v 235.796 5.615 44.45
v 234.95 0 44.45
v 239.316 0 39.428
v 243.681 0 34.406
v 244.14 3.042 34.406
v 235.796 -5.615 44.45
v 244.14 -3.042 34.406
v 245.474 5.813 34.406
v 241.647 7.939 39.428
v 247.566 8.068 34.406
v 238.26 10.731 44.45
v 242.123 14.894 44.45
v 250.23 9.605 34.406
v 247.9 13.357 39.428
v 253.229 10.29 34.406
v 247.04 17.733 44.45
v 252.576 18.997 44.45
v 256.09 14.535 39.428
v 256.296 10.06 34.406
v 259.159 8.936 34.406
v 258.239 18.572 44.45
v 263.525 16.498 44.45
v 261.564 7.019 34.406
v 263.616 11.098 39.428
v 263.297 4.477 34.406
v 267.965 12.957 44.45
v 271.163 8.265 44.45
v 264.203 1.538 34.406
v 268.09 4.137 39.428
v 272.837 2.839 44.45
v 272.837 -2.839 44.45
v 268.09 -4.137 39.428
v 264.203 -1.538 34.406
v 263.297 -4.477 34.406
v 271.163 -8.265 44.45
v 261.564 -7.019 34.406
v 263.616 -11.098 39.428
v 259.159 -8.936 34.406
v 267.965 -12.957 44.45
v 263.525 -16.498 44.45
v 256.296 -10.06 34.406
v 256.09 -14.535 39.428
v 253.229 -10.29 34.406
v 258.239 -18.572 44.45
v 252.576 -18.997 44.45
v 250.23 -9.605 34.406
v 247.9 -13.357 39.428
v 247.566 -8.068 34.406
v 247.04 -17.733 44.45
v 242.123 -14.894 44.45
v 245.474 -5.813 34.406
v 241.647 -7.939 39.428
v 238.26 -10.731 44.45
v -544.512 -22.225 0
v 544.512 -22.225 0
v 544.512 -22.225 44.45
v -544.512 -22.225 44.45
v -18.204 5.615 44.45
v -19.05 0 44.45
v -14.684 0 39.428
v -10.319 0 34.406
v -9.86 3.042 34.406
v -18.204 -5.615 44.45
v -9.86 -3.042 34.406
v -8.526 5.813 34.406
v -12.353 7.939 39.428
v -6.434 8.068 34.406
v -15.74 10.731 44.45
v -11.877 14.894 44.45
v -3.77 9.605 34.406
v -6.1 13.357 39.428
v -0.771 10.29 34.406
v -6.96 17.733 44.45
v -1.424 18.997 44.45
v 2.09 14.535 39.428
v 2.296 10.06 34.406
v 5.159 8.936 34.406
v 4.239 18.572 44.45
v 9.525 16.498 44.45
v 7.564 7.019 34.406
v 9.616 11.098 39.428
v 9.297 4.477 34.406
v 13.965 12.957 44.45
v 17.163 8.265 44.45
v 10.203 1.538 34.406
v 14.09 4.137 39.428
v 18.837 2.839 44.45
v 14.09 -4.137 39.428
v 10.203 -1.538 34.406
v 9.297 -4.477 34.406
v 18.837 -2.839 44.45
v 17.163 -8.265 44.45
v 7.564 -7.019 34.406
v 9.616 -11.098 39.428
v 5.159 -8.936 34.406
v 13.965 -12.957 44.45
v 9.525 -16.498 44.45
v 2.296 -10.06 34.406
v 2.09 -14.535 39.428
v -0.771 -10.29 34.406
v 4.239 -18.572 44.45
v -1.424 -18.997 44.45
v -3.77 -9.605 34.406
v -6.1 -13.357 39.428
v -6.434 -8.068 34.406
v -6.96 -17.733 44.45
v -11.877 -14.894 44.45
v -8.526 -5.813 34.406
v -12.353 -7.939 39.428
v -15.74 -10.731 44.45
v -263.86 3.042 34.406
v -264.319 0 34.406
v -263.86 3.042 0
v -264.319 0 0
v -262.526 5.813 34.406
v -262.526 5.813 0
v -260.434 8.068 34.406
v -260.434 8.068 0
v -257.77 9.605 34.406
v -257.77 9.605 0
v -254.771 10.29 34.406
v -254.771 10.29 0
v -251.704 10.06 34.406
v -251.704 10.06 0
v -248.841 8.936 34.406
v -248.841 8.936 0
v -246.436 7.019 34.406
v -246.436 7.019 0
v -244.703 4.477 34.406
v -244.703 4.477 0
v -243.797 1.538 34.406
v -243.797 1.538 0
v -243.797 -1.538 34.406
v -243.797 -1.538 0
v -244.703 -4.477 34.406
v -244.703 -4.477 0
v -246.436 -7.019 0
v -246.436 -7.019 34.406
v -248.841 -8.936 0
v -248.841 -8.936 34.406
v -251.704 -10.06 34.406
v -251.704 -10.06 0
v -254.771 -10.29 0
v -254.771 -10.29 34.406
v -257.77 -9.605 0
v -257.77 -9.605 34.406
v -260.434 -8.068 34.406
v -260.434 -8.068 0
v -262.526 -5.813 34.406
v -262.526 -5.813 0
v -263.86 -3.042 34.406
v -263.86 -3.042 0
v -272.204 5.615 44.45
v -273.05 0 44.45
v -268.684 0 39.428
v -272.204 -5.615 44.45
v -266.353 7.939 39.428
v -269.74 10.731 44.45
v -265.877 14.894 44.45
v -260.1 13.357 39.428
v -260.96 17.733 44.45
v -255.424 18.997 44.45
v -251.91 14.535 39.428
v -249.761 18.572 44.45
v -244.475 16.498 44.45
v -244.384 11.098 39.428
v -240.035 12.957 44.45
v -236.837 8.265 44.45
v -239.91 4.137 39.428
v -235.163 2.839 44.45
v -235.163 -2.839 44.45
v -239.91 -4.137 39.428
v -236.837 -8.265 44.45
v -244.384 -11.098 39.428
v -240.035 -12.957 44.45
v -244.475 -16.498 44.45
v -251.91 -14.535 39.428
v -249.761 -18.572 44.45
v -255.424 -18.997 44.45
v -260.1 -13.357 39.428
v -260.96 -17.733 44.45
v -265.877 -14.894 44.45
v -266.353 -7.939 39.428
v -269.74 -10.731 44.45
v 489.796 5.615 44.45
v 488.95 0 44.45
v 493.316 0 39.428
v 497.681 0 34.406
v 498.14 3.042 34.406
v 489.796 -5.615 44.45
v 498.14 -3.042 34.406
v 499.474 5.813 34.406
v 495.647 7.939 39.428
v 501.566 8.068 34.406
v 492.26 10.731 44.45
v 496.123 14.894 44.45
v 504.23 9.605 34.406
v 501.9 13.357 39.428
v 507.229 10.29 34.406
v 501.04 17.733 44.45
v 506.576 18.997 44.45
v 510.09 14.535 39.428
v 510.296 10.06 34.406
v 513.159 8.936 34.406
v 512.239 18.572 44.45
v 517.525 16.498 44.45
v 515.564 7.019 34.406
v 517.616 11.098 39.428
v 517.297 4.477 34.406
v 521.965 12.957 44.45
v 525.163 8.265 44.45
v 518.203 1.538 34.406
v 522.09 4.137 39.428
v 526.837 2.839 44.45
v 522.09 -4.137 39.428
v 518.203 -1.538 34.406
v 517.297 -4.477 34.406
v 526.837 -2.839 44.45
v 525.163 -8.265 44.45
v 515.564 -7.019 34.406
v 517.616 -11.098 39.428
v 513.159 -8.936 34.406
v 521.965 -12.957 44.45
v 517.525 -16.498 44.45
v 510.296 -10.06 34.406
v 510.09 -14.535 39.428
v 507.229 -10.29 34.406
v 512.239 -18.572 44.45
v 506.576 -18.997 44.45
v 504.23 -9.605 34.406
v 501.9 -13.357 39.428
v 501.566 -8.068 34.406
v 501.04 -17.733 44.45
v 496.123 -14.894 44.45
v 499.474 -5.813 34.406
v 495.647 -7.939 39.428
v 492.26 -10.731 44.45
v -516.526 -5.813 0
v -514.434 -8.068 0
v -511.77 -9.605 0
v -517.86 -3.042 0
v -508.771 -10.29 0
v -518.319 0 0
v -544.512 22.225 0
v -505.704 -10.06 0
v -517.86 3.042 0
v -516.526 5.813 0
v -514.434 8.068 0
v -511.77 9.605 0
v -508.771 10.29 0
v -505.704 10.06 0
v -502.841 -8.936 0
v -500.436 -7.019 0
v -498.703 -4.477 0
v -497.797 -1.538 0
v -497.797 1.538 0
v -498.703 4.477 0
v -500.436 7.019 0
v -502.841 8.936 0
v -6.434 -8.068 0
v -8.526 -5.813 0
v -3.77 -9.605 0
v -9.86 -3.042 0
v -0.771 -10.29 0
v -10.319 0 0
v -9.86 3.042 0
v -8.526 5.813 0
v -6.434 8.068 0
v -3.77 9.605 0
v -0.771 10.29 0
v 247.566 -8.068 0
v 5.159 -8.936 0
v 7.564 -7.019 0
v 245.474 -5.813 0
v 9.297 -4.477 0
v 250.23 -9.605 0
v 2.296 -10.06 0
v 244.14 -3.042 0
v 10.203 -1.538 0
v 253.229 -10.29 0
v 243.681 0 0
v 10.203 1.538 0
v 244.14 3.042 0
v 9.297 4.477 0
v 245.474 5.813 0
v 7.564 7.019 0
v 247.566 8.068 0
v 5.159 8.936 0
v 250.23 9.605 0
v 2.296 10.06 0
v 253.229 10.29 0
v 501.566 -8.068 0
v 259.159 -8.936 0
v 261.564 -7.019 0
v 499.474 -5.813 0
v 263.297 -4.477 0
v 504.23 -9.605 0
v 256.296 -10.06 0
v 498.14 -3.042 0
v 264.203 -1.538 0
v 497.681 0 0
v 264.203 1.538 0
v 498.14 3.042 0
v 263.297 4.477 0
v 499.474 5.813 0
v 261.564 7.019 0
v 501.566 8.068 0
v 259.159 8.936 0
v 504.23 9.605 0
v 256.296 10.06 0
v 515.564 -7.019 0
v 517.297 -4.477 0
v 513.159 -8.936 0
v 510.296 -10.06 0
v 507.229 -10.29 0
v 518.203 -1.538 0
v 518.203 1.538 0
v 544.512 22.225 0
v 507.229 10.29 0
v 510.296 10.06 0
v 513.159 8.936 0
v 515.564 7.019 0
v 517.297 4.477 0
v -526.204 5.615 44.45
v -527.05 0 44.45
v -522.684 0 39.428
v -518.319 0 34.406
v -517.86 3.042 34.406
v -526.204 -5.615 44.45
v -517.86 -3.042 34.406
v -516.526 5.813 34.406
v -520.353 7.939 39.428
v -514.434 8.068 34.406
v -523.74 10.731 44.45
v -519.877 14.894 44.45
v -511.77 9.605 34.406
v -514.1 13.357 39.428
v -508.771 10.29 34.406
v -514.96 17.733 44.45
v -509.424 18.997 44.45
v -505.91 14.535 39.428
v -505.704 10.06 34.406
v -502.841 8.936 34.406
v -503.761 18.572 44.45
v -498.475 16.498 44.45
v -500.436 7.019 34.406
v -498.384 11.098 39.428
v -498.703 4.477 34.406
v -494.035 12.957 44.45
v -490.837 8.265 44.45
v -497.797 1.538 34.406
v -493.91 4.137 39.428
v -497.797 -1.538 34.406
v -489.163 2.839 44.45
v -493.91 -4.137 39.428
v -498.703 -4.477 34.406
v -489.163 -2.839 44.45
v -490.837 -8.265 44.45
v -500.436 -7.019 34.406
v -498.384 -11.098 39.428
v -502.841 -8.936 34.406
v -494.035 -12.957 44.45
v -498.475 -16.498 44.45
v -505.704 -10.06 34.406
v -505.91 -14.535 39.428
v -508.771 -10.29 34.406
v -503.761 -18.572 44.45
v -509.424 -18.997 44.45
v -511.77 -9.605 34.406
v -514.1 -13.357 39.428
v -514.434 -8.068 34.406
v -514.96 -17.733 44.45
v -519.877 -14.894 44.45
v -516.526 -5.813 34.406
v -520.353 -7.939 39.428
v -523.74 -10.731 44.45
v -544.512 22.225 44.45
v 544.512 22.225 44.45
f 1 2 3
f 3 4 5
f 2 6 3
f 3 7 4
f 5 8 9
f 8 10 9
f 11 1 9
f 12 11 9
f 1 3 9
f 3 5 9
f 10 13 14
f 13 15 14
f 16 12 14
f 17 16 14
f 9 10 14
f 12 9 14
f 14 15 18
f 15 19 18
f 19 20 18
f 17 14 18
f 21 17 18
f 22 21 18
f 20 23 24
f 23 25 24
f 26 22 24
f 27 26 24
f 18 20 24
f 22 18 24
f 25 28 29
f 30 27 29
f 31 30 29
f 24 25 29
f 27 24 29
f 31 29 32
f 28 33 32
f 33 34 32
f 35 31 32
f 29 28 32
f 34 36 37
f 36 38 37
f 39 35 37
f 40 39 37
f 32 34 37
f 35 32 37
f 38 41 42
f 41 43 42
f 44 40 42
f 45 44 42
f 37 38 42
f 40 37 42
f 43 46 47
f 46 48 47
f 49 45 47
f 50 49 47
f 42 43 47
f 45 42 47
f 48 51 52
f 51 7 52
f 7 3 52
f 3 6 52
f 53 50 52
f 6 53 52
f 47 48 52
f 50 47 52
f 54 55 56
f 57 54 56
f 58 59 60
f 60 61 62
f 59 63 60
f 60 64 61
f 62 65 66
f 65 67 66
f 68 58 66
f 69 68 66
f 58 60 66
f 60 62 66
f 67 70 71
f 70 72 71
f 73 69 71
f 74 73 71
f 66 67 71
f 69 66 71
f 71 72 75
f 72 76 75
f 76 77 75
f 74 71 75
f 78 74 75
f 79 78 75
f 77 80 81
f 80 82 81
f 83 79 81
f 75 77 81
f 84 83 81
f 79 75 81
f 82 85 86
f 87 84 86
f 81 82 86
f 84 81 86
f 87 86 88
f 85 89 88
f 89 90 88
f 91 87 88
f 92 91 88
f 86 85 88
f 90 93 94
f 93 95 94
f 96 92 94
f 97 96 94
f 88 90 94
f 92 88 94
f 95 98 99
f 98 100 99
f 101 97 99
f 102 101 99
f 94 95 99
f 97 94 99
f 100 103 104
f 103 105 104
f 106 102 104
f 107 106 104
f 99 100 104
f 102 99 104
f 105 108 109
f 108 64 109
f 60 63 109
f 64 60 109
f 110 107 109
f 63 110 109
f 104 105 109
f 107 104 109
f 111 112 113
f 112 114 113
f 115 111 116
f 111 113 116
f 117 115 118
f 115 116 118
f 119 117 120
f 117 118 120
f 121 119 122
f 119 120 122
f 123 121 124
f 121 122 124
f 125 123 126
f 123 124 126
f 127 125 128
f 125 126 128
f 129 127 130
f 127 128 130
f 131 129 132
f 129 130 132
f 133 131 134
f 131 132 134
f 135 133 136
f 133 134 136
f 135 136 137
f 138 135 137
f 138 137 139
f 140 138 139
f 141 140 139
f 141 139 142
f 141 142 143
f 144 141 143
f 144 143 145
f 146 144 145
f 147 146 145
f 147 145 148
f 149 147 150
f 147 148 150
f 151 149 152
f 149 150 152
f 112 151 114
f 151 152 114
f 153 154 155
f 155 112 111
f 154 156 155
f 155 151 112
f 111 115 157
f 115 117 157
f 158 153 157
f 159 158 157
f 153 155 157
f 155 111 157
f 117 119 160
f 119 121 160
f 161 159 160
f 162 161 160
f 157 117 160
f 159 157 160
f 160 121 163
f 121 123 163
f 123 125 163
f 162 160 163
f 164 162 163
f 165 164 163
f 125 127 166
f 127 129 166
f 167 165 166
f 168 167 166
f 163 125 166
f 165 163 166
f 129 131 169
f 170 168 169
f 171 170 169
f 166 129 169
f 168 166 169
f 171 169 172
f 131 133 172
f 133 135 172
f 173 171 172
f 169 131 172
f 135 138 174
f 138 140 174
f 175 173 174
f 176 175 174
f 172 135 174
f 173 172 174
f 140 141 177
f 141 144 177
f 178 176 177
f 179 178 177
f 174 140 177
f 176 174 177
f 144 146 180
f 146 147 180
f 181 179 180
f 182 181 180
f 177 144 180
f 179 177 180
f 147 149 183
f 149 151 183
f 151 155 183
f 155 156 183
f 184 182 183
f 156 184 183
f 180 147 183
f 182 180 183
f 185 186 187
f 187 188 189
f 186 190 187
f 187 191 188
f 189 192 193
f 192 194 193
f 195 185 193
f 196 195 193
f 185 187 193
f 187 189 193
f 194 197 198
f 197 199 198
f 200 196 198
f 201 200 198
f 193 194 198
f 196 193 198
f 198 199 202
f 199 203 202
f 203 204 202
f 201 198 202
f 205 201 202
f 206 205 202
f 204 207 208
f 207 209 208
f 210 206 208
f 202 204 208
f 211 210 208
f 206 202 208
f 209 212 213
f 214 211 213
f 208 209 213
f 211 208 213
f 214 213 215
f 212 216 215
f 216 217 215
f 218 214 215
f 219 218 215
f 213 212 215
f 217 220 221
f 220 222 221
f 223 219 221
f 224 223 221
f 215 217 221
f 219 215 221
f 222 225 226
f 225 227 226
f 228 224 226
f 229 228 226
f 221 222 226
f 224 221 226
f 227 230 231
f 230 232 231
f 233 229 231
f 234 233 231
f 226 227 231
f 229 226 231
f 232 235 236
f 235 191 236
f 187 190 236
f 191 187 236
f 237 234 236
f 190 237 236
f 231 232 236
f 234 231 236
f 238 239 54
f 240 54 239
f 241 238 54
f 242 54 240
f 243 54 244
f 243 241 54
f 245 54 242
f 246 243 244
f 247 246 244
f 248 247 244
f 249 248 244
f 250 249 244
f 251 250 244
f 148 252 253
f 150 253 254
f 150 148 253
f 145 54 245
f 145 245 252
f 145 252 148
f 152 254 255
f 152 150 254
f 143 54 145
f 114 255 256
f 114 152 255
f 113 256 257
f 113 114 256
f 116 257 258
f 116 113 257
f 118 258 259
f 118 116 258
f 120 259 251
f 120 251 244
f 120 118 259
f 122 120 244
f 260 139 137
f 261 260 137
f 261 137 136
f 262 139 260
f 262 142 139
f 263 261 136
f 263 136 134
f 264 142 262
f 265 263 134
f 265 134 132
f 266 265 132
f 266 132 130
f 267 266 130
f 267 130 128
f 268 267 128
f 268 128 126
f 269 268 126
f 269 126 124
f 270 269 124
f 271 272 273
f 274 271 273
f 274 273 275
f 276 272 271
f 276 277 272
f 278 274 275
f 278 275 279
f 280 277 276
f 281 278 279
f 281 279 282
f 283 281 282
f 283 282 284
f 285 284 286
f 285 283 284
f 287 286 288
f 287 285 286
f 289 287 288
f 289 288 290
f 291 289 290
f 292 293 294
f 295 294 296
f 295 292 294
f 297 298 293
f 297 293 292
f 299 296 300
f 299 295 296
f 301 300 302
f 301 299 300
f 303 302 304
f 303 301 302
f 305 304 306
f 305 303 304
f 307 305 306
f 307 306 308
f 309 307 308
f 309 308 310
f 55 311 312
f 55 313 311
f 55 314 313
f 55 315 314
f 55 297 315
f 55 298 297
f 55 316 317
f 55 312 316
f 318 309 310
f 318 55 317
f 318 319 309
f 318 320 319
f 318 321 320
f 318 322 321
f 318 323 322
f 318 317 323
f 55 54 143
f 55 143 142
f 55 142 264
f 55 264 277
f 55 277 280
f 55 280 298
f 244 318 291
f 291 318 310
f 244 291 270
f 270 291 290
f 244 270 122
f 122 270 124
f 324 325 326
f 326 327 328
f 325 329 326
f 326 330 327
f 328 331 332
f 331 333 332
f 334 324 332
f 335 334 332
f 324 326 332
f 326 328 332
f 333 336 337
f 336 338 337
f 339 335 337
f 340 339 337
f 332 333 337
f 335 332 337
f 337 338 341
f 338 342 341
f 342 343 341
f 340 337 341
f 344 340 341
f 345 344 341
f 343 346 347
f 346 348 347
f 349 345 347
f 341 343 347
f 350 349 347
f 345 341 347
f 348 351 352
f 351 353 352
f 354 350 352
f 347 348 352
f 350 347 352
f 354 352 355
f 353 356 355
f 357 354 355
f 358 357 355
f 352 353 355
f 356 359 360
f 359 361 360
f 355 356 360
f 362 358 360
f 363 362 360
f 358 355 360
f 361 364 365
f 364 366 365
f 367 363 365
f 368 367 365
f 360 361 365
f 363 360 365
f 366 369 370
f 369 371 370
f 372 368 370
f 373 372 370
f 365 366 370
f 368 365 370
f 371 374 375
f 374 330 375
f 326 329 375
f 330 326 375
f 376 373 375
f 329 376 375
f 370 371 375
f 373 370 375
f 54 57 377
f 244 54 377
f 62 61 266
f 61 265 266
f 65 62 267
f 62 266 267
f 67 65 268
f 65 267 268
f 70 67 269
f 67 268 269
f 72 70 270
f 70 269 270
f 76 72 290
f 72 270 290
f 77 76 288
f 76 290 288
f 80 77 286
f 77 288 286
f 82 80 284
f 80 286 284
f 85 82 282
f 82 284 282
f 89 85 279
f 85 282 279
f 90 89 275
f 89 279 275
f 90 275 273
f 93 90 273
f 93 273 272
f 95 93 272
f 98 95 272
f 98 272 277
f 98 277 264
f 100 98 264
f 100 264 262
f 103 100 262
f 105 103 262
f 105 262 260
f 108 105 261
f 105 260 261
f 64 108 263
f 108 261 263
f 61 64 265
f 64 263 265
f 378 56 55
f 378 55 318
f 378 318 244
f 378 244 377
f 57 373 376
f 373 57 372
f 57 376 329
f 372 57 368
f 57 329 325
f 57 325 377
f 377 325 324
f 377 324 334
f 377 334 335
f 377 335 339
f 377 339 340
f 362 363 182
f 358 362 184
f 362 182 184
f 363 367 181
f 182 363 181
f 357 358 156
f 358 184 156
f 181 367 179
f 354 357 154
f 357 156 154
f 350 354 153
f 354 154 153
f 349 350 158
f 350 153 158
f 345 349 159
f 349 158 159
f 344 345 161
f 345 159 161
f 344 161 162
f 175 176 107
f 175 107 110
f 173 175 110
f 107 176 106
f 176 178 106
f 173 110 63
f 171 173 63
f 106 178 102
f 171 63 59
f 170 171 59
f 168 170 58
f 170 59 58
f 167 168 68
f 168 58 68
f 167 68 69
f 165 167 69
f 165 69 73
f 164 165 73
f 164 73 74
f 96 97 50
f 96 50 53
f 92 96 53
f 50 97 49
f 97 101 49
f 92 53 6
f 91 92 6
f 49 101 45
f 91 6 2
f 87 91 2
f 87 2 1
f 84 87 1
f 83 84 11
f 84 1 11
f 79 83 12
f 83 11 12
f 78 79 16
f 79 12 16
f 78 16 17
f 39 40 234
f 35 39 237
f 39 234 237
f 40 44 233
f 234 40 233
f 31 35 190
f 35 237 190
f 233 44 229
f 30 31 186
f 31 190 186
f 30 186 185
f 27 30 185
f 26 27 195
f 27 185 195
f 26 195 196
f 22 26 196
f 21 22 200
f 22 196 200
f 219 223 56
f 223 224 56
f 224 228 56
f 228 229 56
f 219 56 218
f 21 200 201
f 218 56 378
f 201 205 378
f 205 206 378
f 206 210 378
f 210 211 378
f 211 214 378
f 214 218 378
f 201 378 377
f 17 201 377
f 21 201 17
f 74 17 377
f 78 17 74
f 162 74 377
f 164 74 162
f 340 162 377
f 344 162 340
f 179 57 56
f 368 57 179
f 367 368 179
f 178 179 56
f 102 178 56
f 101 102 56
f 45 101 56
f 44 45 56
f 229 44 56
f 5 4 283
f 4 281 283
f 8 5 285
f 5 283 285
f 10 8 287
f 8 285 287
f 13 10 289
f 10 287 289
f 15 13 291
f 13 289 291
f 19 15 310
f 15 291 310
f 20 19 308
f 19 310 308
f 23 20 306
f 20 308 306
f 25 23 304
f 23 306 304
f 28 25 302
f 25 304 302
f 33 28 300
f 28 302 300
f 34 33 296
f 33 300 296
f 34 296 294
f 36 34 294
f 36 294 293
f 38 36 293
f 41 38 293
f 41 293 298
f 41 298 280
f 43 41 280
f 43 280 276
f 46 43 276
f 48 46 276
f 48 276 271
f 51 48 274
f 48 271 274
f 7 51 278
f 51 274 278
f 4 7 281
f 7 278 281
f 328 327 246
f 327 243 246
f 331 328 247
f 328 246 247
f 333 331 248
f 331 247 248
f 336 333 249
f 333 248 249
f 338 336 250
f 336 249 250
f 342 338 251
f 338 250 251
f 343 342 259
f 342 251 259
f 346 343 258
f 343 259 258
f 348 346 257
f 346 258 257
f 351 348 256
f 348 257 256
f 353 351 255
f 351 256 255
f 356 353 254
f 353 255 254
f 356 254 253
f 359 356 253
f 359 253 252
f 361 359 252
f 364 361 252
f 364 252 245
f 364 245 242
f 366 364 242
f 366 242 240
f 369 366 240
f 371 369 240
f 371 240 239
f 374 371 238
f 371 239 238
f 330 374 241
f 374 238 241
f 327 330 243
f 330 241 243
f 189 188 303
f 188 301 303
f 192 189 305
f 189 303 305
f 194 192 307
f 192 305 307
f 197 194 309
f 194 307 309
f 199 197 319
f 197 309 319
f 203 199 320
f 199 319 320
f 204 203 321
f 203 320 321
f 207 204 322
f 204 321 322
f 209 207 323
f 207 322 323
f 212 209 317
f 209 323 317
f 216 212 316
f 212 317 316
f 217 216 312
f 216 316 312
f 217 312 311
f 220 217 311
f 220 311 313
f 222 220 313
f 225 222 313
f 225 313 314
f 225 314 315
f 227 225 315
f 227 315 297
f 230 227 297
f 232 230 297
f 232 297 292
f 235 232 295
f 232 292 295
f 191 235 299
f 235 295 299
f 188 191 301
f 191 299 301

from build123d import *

# Parameters (mm, degrees)
F0_W           = 44.45
F0_H           = 44.45
F1_DEPTH       = 544.5125
F3_D           = 20.6375
F3_CSINK_D     = 38.1
F3_CSINK_ANGLE = 82


with BuildPart() as f1:
    # F0 (on Right) → F1 (new body, symmetric)
    with BuildSketch(Plane.YZ):
        with Locations((0, 22.225)):
            Rectangle(F0_W, F0_H)
    extrude(amount=F1_DEPTH, both=True)

    # F3 (through all)
    with Locations(Plane.XY.offset(44.45)):
        with Locations((-508, 0), (-254, 0), (0, 0), (254, 0), (508, 0)):
            CounterSinkHole(F3_D / 2, F3_CSINK_D / 2, counter_sink_angle=F3_CSINK_ANGLE)


solid = f1.part
